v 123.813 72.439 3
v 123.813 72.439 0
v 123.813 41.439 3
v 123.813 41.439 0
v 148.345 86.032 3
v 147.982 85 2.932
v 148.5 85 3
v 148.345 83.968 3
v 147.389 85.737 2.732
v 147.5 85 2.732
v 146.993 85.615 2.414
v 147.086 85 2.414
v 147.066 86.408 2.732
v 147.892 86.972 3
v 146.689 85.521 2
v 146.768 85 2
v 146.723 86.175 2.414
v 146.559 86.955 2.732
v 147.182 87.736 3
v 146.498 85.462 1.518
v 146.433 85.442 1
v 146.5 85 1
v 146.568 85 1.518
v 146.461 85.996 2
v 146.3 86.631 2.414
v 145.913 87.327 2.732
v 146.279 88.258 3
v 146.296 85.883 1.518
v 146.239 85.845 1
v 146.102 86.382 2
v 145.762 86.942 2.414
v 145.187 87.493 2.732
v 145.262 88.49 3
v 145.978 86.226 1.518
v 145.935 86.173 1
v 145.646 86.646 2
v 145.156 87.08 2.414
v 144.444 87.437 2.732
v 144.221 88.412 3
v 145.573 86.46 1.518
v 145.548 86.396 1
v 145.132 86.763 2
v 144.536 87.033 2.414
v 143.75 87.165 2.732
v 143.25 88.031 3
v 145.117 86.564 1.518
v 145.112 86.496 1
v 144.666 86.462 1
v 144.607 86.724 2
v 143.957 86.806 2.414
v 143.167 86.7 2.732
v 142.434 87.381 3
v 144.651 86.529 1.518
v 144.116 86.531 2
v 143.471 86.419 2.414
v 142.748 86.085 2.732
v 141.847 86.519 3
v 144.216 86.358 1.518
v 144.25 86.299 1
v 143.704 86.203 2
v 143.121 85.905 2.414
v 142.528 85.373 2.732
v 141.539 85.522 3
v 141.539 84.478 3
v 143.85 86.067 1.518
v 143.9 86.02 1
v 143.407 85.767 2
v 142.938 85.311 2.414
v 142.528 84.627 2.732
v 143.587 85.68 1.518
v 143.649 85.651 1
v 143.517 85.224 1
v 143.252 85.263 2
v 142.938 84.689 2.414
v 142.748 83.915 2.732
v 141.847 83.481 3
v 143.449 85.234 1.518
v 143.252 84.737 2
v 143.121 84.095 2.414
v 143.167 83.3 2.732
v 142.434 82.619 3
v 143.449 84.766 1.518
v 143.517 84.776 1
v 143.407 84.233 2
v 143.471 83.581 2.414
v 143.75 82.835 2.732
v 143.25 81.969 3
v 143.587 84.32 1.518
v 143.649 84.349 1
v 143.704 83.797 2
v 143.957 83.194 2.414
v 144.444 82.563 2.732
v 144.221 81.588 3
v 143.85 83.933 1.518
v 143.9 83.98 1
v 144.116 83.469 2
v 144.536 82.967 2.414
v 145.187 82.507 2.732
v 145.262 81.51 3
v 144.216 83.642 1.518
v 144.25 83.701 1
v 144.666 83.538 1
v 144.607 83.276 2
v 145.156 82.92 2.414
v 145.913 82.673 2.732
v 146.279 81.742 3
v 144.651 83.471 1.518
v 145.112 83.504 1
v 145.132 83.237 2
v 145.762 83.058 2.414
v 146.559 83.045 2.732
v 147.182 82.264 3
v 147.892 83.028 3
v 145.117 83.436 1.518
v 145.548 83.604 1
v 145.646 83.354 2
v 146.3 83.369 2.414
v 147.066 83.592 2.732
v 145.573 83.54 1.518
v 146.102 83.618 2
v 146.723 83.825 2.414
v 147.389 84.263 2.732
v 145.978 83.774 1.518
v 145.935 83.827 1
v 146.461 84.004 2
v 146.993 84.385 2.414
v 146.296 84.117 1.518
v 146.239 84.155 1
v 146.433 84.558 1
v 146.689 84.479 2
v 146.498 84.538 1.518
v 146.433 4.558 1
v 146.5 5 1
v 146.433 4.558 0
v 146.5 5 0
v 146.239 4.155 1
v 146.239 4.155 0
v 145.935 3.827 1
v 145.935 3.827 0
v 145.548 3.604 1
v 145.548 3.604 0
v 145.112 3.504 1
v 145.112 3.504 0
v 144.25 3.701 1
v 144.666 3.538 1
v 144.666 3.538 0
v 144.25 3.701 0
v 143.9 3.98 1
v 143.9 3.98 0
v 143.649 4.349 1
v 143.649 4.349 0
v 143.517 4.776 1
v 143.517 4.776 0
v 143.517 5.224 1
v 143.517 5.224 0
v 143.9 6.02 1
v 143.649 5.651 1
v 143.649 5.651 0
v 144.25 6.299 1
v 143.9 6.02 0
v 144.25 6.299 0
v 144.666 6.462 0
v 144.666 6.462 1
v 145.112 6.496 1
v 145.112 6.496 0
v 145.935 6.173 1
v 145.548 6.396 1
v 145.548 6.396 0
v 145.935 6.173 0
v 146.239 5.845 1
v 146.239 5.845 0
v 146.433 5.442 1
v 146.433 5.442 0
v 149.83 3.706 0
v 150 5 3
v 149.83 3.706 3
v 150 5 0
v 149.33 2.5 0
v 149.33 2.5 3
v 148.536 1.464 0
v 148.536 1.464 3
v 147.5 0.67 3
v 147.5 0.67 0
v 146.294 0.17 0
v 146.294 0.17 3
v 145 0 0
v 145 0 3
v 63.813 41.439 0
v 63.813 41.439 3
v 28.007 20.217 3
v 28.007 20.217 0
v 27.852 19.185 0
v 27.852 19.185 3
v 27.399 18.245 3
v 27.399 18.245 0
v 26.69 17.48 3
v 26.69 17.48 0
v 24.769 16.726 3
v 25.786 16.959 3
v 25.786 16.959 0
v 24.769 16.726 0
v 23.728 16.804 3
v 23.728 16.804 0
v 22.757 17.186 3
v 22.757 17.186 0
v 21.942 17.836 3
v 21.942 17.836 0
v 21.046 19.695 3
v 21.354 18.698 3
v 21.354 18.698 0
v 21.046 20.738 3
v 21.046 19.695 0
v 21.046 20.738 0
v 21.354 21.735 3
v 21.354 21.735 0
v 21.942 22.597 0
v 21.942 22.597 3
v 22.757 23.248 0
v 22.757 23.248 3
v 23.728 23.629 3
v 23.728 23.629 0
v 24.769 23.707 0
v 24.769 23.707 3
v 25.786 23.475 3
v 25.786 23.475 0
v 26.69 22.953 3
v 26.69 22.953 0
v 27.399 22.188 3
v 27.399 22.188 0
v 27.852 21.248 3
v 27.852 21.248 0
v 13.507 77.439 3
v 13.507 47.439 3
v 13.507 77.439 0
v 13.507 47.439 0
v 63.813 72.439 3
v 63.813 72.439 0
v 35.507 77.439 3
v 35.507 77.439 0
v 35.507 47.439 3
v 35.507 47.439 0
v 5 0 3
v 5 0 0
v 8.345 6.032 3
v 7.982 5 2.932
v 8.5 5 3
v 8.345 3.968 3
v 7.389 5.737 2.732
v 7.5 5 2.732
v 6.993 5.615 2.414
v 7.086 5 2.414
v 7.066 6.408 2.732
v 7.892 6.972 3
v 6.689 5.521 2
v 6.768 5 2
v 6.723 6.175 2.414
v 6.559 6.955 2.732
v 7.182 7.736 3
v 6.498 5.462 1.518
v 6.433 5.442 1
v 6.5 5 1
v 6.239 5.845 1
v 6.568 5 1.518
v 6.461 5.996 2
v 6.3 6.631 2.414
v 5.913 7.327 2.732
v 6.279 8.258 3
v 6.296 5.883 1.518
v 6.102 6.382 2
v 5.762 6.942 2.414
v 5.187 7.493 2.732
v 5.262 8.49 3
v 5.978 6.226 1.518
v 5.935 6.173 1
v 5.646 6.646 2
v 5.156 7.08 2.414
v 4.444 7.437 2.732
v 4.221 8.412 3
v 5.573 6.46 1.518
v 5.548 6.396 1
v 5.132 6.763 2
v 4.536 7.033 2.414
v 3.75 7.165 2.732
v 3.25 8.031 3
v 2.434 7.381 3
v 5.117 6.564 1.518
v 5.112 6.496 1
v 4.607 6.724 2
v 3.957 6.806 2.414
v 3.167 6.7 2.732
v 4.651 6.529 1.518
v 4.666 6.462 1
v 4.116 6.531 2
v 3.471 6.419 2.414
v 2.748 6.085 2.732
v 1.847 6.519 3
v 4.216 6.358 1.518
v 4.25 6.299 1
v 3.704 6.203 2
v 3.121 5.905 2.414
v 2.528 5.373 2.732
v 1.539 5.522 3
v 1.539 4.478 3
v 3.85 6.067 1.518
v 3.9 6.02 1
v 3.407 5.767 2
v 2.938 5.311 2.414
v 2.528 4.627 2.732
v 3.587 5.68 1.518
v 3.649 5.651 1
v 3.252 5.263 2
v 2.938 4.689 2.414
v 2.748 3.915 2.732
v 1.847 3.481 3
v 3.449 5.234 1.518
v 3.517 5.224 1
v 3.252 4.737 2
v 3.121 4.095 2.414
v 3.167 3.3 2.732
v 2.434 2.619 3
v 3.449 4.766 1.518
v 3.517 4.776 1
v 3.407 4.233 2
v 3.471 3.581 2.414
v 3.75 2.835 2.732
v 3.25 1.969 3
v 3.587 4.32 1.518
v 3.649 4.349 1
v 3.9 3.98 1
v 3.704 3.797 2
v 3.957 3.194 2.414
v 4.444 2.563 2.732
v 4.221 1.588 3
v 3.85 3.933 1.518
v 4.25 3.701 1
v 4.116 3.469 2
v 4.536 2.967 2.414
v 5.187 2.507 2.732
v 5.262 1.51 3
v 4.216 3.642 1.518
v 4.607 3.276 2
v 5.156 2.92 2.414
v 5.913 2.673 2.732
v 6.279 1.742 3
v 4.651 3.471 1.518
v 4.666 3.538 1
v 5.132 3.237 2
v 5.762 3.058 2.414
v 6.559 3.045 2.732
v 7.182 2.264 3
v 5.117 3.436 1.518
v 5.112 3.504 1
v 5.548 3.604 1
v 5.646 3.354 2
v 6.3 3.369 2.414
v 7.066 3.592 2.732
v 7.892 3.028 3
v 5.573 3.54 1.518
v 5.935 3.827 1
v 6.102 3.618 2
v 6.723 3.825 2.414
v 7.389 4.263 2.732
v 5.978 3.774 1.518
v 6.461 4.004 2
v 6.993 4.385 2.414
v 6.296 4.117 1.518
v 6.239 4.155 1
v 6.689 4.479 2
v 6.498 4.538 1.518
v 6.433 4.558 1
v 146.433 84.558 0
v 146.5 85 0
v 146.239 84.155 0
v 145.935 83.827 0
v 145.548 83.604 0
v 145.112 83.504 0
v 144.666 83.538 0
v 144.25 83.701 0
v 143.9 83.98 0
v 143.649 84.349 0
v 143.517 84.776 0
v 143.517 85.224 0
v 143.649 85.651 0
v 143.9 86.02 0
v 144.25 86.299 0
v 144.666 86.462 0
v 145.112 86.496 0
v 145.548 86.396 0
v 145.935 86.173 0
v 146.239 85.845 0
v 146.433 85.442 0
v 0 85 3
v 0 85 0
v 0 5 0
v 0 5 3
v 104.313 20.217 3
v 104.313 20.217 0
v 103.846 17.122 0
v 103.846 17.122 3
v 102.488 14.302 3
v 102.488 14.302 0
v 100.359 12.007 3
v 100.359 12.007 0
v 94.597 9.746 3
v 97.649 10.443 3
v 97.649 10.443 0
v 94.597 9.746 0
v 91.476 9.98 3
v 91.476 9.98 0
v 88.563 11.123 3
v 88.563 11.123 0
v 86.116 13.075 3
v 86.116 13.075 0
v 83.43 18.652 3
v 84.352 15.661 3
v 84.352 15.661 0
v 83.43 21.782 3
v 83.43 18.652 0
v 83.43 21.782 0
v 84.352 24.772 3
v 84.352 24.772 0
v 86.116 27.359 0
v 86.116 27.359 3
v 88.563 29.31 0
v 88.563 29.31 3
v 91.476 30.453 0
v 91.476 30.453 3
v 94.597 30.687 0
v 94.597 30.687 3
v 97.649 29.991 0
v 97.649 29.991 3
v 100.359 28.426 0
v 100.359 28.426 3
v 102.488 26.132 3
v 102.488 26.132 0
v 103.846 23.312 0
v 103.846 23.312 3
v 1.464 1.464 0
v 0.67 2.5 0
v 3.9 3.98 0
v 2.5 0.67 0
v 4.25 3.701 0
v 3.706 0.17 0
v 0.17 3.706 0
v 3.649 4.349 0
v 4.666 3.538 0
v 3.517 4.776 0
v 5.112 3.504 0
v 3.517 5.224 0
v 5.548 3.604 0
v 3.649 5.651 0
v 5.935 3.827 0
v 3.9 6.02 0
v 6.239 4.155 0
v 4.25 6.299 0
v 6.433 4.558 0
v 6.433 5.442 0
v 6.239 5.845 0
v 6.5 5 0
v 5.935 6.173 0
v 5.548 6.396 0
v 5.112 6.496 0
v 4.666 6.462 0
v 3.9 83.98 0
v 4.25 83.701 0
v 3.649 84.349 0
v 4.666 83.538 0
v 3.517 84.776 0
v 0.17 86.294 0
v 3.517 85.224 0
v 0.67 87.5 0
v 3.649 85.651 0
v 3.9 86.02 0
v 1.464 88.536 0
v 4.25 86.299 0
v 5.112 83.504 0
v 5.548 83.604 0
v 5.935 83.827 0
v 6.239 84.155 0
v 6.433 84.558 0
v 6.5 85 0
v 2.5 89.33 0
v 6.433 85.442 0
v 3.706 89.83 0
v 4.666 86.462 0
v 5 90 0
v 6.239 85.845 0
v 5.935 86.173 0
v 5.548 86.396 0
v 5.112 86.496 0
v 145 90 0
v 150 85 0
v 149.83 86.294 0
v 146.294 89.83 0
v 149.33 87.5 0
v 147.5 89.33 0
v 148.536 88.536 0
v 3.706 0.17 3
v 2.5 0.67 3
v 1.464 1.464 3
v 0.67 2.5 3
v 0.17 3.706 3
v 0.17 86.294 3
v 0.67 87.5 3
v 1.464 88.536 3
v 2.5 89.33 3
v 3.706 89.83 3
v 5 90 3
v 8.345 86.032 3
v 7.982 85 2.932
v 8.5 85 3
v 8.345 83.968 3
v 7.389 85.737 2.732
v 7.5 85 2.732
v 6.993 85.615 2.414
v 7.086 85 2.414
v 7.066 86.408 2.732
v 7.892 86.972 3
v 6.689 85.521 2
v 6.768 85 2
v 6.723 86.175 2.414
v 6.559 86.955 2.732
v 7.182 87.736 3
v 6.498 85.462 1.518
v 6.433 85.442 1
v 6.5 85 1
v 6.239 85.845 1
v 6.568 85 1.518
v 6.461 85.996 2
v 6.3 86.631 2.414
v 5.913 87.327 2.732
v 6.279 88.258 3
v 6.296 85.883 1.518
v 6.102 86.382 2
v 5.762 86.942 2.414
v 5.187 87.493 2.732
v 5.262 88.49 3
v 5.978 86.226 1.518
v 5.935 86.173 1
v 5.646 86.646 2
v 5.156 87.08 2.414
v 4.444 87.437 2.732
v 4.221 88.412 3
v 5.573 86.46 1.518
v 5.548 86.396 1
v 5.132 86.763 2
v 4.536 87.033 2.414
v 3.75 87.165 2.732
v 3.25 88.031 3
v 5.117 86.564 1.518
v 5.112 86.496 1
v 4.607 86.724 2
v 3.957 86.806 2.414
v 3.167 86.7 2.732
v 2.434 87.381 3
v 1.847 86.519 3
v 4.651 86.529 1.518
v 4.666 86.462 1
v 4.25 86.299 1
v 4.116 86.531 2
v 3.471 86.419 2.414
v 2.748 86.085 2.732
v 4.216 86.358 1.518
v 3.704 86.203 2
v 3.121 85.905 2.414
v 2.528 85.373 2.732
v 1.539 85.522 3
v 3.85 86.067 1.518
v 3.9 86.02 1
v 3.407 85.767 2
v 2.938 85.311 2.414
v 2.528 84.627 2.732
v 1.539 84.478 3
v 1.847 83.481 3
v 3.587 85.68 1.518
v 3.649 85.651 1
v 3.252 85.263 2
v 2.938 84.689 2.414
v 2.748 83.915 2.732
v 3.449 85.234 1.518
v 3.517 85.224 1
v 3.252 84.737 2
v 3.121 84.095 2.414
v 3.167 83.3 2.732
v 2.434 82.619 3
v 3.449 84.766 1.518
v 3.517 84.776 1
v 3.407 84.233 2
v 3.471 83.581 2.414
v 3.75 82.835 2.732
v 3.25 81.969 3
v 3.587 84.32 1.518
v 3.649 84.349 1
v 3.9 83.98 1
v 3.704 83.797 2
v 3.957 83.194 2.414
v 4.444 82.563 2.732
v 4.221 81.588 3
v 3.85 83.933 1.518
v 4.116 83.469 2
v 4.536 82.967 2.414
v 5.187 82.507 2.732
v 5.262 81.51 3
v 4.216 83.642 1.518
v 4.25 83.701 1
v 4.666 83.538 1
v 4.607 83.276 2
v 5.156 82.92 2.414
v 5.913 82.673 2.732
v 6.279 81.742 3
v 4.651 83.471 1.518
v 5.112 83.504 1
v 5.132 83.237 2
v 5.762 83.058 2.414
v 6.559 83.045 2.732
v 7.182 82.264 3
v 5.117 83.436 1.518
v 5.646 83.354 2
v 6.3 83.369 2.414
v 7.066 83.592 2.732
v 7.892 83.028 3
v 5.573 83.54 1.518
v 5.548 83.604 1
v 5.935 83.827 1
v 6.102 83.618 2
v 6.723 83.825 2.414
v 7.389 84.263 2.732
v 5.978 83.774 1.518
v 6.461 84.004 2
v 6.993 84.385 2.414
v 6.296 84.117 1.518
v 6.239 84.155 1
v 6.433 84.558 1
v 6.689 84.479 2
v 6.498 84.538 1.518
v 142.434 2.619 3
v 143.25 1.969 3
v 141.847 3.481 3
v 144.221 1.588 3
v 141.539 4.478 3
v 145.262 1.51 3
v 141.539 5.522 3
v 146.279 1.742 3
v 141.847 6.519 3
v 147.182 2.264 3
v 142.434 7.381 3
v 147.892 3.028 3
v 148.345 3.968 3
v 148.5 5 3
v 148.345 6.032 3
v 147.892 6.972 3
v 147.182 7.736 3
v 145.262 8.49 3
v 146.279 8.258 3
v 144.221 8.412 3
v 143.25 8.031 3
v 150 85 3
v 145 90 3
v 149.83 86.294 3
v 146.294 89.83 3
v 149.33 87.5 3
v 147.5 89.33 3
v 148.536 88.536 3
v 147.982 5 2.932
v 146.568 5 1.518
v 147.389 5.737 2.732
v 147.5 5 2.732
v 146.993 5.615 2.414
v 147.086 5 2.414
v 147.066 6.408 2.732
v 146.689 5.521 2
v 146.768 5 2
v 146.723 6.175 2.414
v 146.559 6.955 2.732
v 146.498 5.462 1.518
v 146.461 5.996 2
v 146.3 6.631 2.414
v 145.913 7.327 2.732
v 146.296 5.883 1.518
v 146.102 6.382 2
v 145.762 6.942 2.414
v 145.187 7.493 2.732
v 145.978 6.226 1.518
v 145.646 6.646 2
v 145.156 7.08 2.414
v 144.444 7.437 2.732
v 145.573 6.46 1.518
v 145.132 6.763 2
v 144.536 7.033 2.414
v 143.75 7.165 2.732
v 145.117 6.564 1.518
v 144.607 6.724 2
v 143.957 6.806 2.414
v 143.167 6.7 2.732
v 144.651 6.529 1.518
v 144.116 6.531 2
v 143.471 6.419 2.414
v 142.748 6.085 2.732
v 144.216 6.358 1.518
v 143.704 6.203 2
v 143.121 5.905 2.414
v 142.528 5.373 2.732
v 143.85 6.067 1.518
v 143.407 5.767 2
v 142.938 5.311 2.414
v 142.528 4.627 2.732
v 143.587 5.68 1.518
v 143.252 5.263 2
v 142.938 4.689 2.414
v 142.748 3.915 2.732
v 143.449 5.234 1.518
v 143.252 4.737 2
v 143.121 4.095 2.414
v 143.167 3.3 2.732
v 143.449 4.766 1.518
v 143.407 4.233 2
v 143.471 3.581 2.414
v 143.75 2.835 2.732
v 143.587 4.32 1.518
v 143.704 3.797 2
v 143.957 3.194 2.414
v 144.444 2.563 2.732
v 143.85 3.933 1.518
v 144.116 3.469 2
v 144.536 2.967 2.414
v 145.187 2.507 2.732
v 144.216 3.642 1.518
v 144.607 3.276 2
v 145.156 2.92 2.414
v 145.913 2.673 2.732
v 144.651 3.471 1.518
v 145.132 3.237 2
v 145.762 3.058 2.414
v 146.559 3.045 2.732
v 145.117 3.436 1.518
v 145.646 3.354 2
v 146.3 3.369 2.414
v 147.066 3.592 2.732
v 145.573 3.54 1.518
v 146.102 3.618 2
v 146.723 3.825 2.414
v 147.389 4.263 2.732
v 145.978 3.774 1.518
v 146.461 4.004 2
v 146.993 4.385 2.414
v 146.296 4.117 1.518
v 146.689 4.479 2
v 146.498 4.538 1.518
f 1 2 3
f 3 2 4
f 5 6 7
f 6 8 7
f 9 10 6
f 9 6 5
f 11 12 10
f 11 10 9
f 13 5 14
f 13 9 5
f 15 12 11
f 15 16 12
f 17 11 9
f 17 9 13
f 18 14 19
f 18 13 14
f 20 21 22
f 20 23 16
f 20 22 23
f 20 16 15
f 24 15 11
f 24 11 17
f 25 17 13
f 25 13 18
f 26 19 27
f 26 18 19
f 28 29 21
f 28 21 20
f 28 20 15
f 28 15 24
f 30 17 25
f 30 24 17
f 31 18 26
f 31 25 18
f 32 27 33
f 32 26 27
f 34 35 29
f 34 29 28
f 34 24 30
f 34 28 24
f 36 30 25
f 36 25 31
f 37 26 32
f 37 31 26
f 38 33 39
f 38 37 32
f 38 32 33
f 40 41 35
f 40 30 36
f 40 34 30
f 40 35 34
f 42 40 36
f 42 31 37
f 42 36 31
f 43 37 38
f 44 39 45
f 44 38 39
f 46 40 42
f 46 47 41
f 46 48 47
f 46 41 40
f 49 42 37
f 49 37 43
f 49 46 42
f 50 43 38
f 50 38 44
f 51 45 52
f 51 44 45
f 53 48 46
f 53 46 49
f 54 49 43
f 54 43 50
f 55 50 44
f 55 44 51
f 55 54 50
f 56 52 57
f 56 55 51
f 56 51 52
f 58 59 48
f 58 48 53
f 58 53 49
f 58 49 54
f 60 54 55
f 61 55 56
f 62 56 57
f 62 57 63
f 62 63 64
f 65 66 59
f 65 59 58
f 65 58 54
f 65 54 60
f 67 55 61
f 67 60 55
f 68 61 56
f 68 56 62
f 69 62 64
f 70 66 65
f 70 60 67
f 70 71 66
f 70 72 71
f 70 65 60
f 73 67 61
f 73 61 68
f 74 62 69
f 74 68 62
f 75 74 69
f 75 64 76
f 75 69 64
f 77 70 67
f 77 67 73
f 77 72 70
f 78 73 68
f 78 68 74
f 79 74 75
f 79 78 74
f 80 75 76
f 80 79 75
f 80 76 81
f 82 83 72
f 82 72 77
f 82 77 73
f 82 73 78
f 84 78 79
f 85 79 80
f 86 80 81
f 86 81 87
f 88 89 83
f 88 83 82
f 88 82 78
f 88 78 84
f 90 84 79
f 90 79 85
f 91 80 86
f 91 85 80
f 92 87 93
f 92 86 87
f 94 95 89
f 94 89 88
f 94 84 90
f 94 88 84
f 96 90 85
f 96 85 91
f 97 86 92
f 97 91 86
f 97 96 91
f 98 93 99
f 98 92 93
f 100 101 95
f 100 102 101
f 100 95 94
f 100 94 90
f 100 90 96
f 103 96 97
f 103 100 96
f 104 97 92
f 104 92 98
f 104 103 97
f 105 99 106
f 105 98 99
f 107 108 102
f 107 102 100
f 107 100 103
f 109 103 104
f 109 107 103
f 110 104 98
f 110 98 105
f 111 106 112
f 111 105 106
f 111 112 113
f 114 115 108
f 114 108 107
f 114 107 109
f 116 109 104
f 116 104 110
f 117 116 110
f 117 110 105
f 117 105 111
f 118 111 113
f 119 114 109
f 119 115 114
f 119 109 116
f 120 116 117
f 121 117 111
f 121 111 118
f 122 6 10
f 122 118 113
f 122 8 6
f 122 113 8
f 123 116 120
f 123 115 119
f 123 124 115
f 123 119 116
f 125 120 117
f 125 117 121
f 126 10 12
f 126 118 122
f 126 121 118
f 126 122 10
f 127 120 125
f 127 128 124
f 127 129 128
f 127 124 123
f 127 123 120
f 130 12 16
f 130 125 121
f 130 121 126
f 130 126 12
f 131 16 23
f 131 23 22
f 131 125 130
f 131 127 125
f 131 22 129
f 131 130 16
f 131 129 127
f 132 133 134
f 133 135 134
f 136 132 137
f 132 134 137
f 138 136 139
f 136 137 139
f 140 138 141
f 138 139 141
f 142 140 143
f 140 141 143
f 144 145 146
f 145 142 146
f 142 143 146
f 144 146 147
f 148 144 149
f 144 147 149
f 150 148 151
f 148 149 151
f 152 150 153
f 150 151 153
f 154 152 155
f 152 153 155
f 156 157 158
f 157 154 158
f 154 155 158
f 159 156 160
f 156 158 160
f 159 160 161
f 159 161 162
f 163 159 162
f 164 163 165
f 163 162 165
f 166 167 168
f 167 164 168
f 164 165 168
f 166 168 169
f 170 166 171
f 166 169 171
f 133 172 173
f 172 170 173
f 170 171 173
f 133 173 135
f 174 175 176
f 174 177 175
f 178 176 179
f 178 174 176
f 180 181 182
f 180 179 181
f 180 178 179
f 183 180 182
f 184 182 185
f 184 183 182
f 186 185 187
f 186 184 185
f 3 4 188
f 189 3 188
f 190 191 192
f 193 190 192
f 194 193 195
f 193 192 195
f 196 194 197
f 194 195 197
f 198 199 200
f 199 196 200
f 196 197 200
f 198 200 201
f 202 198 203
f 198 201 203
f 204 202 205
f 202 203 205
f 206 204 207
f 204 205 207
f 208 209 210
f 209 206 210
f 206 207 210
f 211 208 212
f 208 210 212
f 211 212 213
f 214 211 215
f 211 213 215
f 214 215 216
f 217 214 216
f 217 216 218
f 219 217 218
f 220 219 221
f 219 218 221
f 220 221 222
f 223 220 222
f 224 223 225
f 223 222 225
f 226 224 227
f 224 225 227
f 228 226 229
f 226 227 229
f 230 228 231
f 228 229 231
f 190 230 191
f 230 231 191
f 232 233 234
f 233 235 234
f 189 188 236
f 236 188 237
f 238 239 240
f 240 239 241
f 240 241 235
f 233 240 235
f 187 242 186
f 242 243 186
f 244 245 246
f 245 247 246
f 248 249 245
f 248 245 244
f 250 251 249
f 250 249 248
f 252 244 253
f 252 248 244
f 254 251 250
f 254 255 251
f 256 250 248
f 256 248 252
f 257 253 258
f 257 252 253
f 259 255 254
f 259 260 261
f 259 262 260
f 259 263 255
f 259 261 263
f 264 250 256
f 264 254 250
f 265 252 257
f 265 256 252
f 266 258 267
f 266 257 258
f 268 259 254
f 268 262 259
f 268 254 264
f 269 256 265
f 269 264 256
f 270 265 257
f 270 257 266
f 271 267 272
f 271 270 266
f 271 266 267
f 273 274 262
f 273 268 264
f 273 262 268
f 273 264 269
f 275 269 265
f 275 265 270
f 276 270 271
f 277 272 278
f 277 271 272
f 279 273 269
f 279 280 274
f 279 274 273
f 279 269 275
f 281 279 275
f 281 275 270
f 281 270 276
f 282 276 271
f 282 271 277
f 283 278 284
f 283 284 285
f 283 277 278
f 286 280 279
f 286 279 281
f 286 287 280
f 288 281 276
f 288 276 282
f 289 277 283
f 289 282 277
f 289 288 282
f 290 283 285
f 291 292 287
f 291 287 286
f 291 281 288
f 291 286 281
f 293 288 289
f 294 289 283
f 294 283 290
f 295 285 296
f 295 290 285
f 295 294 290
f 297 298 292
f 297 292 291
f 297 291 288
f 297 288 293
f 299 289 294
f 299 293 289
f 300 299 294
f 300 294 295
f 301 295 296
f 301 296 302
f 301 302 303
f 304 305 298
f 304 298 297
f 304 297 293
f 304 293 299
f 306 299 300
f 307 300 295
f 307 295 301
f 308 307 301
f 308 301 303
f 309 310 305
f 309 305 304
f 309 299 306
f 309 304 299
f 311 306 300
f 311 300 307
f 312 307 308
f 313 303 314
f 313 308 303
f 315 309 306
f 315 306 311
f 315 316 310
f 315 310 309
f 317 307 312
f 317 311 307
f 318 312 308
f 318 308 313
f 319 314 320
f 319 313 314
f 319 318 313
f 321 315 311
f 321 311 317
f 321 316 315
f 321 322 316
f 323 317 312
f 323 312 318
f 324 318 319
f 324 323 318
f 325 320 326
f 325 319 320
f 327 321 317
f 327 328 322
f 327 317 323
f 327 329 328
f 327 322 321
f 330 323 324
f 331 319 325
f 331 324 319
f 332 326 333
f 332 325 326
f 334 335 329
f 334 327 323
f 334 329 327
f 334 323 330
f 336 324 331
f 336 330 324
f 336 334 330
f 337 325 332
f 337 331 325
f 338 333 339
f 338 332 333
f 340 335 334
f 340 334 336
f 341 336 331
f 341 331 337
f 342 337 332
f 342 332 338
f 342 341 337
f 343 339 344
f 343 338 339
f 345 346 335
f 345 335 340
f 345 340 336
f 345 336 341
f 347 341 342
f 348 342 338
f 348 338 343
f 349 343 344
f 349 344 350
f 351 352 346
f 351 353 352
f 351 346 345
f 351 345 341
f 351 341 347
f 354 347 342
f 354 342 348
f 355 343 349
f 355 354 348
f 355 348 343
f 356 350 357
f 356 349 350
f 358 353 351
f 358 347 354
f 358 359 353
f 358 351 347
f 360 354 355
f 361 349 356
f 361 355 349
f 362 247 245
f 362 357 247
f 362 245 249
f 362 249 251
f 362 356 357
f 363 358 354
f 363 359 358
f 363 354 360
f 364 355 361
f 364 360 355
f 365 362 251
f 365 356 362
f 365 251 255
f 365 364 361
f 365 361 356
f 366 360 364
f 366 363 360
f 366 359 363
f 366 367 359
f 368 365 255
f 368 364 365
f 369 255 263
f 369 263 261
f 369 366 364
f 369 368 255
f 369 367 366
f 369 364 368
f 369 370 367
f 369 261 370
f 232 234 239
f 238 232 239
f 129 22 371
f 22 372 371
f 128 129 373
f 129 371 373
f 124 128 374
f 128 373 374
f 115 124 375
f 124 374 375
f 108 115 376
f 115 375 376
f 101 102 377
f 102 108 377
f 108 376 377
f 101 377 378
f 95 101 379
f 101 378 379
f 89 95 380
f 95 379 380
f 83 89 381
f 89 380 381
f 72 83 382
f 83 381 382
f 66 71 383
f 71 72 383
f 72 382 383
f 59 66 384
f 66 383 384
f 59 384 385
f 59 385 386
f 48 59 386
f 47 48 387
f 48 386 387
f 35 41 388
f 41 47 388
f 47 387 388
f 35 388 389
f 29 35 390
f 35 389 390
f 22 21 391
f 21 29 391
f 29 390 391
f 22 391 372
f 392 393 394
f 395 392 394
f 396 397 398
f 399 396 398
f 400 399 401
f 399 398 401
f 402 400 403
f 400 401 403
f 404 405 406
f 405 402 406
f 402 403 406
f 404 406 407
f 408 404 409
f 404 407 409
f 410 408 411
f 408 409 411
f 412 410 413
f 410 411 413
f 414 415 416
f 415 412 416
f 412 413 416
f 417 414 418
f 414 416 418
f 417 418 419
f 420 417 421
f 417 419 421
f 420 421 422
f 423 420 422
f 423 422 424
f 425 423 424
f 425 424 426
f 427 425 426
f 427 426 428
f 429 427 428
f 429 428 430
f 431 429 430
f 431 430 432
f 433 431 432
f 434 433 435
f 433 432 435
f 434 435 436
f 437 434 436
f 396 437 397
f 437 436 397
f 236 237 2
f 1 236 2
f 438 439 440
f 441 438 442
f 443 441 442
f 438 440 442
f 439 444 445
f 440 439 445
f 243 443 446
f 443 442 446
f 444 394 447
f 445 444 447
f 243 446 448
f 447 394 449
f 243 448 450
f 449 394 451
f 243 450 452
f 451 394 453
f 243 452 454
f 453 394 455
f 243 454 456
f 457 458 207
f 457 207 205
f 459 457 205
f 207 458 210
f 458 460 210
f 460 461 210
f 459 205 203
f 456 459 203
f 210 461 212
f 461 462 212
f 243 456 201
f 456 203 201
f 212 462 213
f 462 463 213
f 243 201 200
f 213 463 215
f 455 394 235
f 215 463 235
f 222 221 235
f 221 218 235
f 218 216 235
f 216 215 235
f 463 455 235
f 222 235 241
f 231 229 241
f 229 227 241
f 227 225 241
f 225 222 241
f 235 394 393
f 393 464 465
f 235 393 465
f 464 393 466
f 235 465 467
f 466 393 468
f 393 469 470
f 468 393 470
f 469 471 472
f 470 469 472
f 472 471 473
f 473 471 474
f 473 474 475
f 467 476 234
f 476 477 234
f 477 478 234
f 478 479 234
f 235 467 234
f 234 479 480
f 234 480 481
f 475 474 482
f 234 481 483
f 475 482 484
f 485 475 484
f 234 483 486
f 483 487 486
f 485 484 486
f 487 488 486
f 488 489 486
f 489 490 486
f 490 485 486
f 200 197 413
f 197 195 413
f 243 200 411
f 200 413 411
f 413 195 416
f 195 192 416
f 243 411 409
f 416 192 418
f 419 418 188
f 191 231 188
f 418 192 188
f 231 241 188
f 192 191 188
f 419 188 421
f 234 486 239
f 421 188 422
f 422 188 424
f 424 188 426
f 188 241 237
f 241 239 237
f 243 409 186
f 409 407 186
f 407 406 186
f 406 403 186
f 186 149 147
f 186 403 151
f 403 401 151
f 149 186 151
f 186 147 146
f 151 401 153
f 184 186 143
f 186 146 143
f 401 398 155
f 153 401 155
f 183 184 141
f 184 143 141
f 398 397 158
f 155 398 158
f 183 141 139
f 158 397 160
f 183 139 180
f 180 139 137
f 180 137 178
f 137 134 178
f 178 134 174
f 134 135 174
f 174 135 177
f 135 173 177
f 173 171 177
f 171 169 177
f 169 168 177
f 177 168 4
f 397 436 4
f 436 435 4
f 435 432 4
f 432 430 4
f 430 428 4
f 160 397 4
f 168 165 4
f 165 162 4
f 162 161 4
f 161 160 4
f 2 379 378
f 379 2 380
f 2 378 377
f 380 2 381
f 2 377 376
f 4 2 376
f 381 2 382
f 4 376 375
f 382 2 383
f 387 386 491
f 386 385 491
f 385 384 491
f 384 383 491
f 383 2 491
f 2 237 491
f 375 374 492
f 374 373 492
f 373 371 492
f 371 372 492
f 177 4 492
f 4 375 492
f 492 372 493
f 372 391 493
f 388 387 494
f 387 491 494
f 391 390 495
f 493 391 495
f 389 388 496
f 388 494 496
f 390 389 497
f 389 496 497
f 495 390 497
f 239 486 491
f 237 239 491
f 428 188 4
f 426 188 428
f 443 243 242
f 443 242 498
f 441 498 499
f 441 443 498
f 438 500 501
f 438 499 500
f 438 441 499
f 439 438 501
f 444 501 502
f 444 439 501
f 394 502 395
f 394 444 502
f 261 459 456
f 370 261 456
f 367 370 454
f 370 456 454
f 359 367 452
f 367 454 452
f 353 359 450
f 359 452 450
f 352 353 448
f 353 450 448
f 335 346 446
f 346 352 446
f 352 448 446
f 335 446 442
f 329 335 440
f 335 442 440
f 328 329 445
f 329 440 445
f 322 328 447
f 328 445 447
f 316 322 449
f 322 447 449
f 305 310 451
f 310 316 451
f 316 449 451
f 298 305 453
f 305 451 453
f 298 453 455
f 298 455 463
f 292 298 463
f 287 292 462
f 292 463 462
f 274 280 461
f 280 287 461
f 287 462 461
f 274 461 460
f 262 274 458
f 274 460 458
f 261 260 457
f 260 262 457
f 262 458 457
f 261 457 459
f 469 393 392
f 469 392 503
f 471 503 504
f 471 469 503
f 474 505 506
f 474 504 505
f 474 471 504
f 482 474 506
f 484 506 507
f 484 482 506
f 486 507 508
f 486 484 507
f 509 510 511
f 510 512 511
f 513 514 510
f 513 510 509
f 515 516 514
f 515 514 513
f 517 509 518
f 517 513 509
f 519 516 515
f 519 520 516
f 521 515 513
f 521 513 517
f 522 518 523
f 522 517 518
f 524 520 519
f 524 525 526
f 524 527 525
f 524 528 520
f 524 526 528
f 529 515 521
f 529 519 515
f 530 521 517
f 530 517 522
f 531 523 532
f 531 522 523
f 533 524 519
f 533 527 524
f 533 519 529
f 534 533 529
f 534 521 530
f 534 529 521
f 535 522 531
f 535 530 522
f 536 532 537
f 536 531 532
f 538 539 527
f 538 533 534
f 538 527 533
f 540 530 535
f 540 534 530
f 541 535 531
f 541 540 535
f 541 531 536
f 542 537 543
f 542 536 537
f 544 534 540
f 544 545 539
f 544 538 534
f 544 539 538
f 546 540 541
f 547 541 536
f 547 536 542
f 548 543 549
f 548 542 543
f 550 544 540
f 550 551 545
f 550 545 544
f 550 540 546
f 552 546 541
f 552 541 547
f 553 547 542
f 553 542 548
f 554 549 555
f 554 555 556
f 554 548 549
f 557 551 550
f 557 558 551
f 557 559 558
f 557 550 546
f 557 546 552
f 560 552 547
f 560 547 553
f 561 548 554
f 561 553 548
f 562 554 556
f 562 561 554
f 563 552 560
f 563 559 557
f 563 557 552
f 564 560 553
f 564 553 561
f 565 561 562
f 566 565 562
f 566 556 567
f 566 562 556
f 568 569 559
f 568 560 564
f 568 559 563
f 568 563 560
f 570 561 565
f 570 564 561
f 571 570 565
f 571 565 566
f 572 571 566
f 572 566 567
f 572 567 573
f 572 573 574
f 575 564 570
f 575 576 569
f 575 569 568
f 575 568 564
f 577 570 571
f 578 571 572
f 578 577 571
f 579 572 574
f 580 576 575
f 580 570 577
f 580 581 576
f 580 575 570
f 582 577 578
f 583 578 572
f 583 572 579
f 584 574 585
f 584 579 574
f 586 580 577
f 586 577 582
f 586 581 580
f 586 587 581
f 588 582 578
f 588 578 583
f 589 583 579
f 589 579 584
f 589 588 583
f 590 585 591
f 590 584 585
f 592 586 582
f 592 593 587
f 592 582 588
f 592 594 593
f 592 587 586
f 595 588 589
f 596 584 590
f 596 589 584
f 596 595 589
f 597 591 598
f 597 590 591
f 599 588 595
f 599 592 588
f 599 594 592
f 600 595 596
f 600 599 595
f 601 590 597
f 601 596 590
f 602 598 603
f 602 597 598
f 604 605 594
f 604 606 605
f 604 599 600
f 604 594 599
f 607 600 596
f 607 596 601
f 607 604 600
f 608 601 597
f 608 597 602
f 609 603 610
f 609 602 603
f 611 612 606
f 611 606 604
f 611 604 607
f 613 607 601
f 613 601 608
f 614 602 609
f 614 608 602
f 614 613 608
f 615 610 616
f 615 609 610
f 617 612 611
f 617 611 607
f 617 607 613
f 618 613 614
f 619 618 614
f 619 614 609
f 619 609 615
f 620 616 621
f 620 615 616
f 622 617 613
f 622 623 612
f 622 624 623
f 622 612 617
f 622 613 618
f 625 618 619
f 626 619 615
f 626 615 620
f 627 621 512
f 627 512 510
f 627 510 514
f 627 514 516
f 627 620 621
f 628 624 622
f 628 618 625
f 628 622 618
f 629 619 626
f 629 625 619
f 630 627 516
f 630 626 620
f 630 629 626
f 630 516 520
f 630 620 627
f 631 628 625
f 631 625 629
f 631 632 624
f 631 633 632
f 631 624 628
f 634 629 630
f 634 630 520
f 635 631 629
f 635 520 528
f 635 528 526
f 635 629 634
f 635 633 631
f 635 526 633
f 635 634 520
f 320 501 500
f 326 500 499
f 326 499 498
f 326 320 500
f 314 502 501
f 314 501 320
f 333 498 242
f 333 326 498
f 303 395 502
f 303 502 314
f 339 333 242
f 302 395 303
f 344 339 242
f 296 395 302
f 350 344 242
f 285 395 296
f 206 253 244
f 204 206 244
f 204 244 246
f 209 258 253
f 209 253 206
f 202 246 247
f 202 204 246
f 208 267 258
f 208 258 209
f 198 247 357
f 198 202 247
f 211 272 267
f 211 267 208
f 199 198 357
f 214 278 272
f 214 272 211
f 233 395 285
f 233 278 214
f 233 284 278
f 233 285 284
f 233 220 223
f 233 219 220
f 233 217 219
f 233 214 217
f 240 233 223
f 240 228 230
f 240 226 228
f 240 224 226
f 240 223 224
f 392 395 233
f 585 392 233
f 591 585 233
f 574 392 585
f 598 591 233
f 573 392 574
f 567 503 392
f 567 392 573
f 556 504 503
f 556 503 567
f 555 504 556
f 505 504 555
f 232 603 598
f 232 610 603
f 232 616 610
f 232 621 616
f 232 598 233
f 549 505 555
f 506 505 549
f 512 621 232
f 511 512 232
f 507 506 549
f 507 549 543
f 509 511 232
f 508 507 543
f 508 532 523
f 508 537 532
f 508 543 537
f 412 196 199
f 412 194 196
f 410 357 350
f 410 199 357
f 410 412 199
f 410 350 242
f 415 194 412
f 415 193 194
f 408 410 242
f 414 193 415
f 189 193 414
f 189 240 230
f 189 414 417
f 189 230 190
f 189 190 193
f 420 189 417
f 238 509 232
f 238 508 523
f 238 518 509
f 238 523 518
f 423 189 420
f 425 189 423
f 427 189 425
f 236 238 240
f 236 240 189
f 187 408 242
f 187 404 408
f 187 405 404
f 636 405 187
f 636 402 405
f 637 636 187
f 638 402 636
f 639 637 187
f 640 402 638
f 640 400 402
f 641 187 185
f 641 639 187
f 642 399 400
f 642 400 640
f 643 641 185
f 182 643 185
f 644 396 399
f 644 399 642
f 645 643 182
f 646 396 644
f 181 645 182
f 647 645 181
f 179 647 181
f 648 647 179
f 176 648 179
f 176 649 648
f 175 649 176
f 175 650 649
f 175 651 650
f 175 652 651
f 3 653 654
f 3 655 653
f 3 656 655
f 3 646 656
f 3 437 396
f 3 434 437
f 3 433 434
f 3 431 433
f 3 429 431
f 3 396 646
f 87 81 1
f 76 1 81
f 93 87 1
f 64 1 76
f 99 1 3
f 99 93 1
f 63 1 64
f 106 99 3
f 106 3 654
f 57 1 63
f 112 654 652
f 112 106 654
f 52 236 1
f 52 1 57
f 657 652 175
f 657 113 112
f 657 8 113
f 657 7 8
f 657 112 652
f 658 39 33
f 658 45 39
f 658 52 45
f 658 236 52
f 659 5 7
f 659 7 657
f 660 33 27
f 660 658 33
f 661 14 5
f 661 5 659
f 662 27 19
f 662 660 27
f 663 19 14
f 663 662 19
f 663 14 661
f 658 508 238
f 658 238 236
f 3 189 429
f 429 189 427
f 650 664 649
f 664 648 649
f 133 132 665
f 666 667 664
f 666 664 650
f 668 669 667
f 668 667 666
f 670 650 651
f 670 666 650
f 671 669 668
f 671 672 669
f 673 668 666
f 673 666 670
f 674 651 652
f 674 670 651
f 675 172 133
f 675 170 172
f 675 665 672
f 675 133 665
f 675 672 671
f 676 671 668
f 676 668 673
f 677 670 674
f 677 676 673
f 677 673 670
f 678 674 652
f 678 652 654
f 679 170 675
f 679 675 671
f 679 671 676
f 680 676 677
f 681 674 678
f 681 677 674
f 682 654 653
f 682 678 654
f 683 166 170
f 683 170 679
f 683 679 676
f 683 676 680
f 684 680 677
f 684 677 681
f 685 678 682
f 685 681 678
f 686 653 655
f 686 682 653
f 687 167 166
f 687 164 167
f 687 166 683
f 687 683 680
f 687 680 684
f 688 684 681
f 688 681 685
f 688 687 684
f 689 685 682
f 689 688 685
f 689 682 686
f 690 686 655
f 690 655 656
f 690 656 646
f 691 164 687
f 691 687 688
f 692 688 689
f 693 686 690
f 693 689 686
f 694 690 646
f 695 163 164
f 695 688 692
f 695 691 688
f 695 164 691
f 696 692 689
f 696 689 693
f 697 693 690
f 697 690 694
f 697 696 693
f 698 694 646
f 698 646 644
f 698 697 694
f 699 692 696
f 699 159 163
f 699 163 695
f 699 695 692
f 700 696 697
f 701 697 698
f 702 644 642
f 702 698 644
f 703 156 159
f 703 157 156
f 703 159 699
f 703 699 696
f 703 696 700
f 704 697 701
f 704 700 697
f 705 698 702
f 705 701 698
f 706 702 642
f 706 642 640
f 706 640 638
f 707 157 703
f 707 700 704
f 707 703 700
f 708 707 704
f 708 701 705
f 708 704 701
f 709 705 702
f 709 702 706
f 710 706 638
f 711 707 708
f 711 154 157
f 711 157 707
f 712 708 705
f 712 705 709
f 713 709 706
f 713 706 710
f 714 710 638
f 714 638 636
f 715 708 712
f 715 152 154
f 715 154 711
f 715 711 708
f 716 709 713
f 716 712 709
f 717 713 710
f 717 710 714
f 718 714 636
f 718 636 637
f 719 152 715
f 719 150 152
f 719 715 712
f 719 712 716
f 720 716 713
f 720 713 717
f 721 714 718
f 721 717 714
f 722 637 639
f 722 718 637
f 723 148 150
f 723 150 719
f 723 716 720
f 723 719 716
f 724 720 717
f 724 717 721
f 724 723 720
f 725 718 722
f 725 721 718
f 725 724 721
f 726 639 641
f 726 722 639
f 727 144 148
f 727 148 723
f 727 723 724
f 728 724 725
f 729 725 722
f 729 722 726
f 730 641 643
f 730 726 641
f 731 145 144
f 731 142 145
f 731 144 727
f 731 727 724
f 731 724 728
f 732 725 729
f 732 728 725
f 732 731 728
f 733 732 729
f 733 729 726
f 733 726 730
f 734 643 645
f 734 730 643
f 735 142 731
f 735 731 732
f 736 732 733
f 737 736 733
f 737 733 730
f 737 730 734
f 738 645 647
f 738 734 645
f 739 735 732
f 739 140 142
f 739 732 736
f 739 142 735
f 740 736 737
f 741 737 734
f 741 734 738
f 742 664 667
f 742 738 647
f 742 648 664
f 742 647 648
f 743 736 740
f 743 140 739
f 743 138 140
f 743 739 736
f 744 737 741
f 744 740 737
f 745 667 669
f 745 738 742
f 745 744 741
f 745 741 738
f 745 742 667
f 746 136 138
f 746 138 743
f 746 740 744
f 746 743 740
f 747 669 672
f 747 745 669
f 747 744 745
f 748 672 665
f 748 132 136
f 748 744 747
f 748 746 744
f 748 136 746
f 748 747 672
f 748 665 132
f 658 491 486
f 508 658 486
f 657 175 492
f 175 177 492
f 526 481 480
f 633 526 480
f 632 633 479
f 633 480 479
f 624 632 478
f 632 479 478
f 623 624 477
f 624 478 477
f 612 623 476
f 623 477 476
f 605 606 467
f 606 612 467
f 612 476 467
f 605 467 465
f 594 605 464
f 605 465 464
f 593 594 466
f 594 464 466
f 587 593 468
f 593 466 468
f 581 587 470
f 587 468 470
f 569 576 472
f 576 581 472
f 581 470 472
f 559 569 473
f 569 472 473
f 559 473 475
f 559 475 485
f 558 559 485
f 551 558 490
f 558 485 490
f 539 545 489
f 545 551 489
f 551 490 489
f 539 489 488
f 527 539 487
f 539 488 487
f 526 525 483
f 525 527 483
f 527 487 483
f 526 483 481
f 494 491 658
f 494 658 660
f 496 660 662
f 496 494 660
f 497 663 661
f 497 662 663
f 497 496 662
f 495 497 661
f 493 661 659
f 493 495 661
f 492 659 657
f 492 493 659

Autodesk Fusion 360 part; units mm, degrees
sketch "Sketch1" plane through (0, 0, 0) normal (0, 0, 1) x (1, 0, 0)
  line L0 (5, 0) -> (145, 0)
  line L1 (150, 5) -> (150, 85)
  line L2 (145, 90) -> (5, 90)
  line L3 (0, 85) -> (0, 5)
  line L4 (123.8126, 41.439) -> (63.8126, 41.439)
  line L5 (63.8126, 41.439) -> (63.8126, 72.439)
  line L6 (63.8126, 72.439) -> (123.8126, 72.439)
  line L7 (123.8126, 72.439) -> (123.8126, 41.439)
  line L8 (123.8126, 41.439) -> (63.8126, 72.439) construction
  line L9 (63.8126, 41.439) -> (123.8126, 72.439) construction
  line L10 (138.8126, 36.439) -> (48.8126, 36.439)
  line L11 (48.8126, 36.439) -> (48.8126, 77.439)
  line L12 (48.8126, 77.439) -> (138.8126, 77.439)
  line L13 (138.8126, 77.439) -> (138.8126, 36.439)
  line L14 (138.8126, 36.439) -> (48.8126, 77.439) construction
  line L15 (48.8126, 36.439) -> (138.8126, 77.439) construction
  line L16 (35.5073, 47.439) -> (13.5073, 47.439)
  line L17 (13.5073, 47.439) -> (13.5073, 77.439)
  line L18 (13.5073, 77.439) -> (35.5073, 77.439)
  line L19 (35.5073, 77.439) -> (35.5073, 47.439)
  line L20 (35.5073, 47.439) -> (13.5073, 77.439) construction
  line L21 (13.5073, 47.439) -> (35.5073, 77.439) construction
  circle A0 centre (24.5073, 20.2167) radius 3.5
  circle A1 centre (93.8126, 20.2167) radius 10.5
  arc A2 (5, 90) -> (0, 85) centre (5, 85) ccw
  arc A3 (150, 85) -> (145, 90) centre (145, 85) ccw
  arc A4 (145, 0) -> (150, 5) centre (145, 5) ccw
  arc A5 (0, 5) -> (5, 0) centre (5, 5) ccw
  circle A6 centre (5, 85) radius 1.5
  circle A7 centre (145, 85) radius 1.5
  circle A8 centre (145, 5) radius 1.5
  circle A9 centre (5, 5) radius 1.5
  point P0 (150, 0)
  point P1 (0, 90)
  point P2 (93.8126, 56.939)
  point P3 (93.8126, 56.939)
  point P4 (24.5073, 62.439)
  dimension "d1" = 150
  dimension "d2" = 90
  dimension "d3" = 60
  dimension "d4" = 31
  dimension "d5" = 90
  dimension "d6" = 41
  dimension "d7" = 22
  dimension "d8" = 30
  dimension "d9" = 7
  dimension "d10" = 21
  dimension "d13" = 5
  dimension "d14" = 5
  dimension "d15" = 5
  dimension "d16" = 5
  dimension "d17" = 3
  dimension "d18" = 3
  dimension "d19" = 3
  dimension "d20" = 3
extrude "Extrude3" add sketch "Sketch1" along normal blind 3 contours L0 L1 L2 L3 A2 A3 A4 A5 | L10 L11 L12 L13
fillet "Fillet1" radius 2 4 edges at (3.6015, 85.5424, 3) (143.6015, 85.5424, 3) (143.6015, 5.5424, 3) (3.6015, 5.5424, 3)
